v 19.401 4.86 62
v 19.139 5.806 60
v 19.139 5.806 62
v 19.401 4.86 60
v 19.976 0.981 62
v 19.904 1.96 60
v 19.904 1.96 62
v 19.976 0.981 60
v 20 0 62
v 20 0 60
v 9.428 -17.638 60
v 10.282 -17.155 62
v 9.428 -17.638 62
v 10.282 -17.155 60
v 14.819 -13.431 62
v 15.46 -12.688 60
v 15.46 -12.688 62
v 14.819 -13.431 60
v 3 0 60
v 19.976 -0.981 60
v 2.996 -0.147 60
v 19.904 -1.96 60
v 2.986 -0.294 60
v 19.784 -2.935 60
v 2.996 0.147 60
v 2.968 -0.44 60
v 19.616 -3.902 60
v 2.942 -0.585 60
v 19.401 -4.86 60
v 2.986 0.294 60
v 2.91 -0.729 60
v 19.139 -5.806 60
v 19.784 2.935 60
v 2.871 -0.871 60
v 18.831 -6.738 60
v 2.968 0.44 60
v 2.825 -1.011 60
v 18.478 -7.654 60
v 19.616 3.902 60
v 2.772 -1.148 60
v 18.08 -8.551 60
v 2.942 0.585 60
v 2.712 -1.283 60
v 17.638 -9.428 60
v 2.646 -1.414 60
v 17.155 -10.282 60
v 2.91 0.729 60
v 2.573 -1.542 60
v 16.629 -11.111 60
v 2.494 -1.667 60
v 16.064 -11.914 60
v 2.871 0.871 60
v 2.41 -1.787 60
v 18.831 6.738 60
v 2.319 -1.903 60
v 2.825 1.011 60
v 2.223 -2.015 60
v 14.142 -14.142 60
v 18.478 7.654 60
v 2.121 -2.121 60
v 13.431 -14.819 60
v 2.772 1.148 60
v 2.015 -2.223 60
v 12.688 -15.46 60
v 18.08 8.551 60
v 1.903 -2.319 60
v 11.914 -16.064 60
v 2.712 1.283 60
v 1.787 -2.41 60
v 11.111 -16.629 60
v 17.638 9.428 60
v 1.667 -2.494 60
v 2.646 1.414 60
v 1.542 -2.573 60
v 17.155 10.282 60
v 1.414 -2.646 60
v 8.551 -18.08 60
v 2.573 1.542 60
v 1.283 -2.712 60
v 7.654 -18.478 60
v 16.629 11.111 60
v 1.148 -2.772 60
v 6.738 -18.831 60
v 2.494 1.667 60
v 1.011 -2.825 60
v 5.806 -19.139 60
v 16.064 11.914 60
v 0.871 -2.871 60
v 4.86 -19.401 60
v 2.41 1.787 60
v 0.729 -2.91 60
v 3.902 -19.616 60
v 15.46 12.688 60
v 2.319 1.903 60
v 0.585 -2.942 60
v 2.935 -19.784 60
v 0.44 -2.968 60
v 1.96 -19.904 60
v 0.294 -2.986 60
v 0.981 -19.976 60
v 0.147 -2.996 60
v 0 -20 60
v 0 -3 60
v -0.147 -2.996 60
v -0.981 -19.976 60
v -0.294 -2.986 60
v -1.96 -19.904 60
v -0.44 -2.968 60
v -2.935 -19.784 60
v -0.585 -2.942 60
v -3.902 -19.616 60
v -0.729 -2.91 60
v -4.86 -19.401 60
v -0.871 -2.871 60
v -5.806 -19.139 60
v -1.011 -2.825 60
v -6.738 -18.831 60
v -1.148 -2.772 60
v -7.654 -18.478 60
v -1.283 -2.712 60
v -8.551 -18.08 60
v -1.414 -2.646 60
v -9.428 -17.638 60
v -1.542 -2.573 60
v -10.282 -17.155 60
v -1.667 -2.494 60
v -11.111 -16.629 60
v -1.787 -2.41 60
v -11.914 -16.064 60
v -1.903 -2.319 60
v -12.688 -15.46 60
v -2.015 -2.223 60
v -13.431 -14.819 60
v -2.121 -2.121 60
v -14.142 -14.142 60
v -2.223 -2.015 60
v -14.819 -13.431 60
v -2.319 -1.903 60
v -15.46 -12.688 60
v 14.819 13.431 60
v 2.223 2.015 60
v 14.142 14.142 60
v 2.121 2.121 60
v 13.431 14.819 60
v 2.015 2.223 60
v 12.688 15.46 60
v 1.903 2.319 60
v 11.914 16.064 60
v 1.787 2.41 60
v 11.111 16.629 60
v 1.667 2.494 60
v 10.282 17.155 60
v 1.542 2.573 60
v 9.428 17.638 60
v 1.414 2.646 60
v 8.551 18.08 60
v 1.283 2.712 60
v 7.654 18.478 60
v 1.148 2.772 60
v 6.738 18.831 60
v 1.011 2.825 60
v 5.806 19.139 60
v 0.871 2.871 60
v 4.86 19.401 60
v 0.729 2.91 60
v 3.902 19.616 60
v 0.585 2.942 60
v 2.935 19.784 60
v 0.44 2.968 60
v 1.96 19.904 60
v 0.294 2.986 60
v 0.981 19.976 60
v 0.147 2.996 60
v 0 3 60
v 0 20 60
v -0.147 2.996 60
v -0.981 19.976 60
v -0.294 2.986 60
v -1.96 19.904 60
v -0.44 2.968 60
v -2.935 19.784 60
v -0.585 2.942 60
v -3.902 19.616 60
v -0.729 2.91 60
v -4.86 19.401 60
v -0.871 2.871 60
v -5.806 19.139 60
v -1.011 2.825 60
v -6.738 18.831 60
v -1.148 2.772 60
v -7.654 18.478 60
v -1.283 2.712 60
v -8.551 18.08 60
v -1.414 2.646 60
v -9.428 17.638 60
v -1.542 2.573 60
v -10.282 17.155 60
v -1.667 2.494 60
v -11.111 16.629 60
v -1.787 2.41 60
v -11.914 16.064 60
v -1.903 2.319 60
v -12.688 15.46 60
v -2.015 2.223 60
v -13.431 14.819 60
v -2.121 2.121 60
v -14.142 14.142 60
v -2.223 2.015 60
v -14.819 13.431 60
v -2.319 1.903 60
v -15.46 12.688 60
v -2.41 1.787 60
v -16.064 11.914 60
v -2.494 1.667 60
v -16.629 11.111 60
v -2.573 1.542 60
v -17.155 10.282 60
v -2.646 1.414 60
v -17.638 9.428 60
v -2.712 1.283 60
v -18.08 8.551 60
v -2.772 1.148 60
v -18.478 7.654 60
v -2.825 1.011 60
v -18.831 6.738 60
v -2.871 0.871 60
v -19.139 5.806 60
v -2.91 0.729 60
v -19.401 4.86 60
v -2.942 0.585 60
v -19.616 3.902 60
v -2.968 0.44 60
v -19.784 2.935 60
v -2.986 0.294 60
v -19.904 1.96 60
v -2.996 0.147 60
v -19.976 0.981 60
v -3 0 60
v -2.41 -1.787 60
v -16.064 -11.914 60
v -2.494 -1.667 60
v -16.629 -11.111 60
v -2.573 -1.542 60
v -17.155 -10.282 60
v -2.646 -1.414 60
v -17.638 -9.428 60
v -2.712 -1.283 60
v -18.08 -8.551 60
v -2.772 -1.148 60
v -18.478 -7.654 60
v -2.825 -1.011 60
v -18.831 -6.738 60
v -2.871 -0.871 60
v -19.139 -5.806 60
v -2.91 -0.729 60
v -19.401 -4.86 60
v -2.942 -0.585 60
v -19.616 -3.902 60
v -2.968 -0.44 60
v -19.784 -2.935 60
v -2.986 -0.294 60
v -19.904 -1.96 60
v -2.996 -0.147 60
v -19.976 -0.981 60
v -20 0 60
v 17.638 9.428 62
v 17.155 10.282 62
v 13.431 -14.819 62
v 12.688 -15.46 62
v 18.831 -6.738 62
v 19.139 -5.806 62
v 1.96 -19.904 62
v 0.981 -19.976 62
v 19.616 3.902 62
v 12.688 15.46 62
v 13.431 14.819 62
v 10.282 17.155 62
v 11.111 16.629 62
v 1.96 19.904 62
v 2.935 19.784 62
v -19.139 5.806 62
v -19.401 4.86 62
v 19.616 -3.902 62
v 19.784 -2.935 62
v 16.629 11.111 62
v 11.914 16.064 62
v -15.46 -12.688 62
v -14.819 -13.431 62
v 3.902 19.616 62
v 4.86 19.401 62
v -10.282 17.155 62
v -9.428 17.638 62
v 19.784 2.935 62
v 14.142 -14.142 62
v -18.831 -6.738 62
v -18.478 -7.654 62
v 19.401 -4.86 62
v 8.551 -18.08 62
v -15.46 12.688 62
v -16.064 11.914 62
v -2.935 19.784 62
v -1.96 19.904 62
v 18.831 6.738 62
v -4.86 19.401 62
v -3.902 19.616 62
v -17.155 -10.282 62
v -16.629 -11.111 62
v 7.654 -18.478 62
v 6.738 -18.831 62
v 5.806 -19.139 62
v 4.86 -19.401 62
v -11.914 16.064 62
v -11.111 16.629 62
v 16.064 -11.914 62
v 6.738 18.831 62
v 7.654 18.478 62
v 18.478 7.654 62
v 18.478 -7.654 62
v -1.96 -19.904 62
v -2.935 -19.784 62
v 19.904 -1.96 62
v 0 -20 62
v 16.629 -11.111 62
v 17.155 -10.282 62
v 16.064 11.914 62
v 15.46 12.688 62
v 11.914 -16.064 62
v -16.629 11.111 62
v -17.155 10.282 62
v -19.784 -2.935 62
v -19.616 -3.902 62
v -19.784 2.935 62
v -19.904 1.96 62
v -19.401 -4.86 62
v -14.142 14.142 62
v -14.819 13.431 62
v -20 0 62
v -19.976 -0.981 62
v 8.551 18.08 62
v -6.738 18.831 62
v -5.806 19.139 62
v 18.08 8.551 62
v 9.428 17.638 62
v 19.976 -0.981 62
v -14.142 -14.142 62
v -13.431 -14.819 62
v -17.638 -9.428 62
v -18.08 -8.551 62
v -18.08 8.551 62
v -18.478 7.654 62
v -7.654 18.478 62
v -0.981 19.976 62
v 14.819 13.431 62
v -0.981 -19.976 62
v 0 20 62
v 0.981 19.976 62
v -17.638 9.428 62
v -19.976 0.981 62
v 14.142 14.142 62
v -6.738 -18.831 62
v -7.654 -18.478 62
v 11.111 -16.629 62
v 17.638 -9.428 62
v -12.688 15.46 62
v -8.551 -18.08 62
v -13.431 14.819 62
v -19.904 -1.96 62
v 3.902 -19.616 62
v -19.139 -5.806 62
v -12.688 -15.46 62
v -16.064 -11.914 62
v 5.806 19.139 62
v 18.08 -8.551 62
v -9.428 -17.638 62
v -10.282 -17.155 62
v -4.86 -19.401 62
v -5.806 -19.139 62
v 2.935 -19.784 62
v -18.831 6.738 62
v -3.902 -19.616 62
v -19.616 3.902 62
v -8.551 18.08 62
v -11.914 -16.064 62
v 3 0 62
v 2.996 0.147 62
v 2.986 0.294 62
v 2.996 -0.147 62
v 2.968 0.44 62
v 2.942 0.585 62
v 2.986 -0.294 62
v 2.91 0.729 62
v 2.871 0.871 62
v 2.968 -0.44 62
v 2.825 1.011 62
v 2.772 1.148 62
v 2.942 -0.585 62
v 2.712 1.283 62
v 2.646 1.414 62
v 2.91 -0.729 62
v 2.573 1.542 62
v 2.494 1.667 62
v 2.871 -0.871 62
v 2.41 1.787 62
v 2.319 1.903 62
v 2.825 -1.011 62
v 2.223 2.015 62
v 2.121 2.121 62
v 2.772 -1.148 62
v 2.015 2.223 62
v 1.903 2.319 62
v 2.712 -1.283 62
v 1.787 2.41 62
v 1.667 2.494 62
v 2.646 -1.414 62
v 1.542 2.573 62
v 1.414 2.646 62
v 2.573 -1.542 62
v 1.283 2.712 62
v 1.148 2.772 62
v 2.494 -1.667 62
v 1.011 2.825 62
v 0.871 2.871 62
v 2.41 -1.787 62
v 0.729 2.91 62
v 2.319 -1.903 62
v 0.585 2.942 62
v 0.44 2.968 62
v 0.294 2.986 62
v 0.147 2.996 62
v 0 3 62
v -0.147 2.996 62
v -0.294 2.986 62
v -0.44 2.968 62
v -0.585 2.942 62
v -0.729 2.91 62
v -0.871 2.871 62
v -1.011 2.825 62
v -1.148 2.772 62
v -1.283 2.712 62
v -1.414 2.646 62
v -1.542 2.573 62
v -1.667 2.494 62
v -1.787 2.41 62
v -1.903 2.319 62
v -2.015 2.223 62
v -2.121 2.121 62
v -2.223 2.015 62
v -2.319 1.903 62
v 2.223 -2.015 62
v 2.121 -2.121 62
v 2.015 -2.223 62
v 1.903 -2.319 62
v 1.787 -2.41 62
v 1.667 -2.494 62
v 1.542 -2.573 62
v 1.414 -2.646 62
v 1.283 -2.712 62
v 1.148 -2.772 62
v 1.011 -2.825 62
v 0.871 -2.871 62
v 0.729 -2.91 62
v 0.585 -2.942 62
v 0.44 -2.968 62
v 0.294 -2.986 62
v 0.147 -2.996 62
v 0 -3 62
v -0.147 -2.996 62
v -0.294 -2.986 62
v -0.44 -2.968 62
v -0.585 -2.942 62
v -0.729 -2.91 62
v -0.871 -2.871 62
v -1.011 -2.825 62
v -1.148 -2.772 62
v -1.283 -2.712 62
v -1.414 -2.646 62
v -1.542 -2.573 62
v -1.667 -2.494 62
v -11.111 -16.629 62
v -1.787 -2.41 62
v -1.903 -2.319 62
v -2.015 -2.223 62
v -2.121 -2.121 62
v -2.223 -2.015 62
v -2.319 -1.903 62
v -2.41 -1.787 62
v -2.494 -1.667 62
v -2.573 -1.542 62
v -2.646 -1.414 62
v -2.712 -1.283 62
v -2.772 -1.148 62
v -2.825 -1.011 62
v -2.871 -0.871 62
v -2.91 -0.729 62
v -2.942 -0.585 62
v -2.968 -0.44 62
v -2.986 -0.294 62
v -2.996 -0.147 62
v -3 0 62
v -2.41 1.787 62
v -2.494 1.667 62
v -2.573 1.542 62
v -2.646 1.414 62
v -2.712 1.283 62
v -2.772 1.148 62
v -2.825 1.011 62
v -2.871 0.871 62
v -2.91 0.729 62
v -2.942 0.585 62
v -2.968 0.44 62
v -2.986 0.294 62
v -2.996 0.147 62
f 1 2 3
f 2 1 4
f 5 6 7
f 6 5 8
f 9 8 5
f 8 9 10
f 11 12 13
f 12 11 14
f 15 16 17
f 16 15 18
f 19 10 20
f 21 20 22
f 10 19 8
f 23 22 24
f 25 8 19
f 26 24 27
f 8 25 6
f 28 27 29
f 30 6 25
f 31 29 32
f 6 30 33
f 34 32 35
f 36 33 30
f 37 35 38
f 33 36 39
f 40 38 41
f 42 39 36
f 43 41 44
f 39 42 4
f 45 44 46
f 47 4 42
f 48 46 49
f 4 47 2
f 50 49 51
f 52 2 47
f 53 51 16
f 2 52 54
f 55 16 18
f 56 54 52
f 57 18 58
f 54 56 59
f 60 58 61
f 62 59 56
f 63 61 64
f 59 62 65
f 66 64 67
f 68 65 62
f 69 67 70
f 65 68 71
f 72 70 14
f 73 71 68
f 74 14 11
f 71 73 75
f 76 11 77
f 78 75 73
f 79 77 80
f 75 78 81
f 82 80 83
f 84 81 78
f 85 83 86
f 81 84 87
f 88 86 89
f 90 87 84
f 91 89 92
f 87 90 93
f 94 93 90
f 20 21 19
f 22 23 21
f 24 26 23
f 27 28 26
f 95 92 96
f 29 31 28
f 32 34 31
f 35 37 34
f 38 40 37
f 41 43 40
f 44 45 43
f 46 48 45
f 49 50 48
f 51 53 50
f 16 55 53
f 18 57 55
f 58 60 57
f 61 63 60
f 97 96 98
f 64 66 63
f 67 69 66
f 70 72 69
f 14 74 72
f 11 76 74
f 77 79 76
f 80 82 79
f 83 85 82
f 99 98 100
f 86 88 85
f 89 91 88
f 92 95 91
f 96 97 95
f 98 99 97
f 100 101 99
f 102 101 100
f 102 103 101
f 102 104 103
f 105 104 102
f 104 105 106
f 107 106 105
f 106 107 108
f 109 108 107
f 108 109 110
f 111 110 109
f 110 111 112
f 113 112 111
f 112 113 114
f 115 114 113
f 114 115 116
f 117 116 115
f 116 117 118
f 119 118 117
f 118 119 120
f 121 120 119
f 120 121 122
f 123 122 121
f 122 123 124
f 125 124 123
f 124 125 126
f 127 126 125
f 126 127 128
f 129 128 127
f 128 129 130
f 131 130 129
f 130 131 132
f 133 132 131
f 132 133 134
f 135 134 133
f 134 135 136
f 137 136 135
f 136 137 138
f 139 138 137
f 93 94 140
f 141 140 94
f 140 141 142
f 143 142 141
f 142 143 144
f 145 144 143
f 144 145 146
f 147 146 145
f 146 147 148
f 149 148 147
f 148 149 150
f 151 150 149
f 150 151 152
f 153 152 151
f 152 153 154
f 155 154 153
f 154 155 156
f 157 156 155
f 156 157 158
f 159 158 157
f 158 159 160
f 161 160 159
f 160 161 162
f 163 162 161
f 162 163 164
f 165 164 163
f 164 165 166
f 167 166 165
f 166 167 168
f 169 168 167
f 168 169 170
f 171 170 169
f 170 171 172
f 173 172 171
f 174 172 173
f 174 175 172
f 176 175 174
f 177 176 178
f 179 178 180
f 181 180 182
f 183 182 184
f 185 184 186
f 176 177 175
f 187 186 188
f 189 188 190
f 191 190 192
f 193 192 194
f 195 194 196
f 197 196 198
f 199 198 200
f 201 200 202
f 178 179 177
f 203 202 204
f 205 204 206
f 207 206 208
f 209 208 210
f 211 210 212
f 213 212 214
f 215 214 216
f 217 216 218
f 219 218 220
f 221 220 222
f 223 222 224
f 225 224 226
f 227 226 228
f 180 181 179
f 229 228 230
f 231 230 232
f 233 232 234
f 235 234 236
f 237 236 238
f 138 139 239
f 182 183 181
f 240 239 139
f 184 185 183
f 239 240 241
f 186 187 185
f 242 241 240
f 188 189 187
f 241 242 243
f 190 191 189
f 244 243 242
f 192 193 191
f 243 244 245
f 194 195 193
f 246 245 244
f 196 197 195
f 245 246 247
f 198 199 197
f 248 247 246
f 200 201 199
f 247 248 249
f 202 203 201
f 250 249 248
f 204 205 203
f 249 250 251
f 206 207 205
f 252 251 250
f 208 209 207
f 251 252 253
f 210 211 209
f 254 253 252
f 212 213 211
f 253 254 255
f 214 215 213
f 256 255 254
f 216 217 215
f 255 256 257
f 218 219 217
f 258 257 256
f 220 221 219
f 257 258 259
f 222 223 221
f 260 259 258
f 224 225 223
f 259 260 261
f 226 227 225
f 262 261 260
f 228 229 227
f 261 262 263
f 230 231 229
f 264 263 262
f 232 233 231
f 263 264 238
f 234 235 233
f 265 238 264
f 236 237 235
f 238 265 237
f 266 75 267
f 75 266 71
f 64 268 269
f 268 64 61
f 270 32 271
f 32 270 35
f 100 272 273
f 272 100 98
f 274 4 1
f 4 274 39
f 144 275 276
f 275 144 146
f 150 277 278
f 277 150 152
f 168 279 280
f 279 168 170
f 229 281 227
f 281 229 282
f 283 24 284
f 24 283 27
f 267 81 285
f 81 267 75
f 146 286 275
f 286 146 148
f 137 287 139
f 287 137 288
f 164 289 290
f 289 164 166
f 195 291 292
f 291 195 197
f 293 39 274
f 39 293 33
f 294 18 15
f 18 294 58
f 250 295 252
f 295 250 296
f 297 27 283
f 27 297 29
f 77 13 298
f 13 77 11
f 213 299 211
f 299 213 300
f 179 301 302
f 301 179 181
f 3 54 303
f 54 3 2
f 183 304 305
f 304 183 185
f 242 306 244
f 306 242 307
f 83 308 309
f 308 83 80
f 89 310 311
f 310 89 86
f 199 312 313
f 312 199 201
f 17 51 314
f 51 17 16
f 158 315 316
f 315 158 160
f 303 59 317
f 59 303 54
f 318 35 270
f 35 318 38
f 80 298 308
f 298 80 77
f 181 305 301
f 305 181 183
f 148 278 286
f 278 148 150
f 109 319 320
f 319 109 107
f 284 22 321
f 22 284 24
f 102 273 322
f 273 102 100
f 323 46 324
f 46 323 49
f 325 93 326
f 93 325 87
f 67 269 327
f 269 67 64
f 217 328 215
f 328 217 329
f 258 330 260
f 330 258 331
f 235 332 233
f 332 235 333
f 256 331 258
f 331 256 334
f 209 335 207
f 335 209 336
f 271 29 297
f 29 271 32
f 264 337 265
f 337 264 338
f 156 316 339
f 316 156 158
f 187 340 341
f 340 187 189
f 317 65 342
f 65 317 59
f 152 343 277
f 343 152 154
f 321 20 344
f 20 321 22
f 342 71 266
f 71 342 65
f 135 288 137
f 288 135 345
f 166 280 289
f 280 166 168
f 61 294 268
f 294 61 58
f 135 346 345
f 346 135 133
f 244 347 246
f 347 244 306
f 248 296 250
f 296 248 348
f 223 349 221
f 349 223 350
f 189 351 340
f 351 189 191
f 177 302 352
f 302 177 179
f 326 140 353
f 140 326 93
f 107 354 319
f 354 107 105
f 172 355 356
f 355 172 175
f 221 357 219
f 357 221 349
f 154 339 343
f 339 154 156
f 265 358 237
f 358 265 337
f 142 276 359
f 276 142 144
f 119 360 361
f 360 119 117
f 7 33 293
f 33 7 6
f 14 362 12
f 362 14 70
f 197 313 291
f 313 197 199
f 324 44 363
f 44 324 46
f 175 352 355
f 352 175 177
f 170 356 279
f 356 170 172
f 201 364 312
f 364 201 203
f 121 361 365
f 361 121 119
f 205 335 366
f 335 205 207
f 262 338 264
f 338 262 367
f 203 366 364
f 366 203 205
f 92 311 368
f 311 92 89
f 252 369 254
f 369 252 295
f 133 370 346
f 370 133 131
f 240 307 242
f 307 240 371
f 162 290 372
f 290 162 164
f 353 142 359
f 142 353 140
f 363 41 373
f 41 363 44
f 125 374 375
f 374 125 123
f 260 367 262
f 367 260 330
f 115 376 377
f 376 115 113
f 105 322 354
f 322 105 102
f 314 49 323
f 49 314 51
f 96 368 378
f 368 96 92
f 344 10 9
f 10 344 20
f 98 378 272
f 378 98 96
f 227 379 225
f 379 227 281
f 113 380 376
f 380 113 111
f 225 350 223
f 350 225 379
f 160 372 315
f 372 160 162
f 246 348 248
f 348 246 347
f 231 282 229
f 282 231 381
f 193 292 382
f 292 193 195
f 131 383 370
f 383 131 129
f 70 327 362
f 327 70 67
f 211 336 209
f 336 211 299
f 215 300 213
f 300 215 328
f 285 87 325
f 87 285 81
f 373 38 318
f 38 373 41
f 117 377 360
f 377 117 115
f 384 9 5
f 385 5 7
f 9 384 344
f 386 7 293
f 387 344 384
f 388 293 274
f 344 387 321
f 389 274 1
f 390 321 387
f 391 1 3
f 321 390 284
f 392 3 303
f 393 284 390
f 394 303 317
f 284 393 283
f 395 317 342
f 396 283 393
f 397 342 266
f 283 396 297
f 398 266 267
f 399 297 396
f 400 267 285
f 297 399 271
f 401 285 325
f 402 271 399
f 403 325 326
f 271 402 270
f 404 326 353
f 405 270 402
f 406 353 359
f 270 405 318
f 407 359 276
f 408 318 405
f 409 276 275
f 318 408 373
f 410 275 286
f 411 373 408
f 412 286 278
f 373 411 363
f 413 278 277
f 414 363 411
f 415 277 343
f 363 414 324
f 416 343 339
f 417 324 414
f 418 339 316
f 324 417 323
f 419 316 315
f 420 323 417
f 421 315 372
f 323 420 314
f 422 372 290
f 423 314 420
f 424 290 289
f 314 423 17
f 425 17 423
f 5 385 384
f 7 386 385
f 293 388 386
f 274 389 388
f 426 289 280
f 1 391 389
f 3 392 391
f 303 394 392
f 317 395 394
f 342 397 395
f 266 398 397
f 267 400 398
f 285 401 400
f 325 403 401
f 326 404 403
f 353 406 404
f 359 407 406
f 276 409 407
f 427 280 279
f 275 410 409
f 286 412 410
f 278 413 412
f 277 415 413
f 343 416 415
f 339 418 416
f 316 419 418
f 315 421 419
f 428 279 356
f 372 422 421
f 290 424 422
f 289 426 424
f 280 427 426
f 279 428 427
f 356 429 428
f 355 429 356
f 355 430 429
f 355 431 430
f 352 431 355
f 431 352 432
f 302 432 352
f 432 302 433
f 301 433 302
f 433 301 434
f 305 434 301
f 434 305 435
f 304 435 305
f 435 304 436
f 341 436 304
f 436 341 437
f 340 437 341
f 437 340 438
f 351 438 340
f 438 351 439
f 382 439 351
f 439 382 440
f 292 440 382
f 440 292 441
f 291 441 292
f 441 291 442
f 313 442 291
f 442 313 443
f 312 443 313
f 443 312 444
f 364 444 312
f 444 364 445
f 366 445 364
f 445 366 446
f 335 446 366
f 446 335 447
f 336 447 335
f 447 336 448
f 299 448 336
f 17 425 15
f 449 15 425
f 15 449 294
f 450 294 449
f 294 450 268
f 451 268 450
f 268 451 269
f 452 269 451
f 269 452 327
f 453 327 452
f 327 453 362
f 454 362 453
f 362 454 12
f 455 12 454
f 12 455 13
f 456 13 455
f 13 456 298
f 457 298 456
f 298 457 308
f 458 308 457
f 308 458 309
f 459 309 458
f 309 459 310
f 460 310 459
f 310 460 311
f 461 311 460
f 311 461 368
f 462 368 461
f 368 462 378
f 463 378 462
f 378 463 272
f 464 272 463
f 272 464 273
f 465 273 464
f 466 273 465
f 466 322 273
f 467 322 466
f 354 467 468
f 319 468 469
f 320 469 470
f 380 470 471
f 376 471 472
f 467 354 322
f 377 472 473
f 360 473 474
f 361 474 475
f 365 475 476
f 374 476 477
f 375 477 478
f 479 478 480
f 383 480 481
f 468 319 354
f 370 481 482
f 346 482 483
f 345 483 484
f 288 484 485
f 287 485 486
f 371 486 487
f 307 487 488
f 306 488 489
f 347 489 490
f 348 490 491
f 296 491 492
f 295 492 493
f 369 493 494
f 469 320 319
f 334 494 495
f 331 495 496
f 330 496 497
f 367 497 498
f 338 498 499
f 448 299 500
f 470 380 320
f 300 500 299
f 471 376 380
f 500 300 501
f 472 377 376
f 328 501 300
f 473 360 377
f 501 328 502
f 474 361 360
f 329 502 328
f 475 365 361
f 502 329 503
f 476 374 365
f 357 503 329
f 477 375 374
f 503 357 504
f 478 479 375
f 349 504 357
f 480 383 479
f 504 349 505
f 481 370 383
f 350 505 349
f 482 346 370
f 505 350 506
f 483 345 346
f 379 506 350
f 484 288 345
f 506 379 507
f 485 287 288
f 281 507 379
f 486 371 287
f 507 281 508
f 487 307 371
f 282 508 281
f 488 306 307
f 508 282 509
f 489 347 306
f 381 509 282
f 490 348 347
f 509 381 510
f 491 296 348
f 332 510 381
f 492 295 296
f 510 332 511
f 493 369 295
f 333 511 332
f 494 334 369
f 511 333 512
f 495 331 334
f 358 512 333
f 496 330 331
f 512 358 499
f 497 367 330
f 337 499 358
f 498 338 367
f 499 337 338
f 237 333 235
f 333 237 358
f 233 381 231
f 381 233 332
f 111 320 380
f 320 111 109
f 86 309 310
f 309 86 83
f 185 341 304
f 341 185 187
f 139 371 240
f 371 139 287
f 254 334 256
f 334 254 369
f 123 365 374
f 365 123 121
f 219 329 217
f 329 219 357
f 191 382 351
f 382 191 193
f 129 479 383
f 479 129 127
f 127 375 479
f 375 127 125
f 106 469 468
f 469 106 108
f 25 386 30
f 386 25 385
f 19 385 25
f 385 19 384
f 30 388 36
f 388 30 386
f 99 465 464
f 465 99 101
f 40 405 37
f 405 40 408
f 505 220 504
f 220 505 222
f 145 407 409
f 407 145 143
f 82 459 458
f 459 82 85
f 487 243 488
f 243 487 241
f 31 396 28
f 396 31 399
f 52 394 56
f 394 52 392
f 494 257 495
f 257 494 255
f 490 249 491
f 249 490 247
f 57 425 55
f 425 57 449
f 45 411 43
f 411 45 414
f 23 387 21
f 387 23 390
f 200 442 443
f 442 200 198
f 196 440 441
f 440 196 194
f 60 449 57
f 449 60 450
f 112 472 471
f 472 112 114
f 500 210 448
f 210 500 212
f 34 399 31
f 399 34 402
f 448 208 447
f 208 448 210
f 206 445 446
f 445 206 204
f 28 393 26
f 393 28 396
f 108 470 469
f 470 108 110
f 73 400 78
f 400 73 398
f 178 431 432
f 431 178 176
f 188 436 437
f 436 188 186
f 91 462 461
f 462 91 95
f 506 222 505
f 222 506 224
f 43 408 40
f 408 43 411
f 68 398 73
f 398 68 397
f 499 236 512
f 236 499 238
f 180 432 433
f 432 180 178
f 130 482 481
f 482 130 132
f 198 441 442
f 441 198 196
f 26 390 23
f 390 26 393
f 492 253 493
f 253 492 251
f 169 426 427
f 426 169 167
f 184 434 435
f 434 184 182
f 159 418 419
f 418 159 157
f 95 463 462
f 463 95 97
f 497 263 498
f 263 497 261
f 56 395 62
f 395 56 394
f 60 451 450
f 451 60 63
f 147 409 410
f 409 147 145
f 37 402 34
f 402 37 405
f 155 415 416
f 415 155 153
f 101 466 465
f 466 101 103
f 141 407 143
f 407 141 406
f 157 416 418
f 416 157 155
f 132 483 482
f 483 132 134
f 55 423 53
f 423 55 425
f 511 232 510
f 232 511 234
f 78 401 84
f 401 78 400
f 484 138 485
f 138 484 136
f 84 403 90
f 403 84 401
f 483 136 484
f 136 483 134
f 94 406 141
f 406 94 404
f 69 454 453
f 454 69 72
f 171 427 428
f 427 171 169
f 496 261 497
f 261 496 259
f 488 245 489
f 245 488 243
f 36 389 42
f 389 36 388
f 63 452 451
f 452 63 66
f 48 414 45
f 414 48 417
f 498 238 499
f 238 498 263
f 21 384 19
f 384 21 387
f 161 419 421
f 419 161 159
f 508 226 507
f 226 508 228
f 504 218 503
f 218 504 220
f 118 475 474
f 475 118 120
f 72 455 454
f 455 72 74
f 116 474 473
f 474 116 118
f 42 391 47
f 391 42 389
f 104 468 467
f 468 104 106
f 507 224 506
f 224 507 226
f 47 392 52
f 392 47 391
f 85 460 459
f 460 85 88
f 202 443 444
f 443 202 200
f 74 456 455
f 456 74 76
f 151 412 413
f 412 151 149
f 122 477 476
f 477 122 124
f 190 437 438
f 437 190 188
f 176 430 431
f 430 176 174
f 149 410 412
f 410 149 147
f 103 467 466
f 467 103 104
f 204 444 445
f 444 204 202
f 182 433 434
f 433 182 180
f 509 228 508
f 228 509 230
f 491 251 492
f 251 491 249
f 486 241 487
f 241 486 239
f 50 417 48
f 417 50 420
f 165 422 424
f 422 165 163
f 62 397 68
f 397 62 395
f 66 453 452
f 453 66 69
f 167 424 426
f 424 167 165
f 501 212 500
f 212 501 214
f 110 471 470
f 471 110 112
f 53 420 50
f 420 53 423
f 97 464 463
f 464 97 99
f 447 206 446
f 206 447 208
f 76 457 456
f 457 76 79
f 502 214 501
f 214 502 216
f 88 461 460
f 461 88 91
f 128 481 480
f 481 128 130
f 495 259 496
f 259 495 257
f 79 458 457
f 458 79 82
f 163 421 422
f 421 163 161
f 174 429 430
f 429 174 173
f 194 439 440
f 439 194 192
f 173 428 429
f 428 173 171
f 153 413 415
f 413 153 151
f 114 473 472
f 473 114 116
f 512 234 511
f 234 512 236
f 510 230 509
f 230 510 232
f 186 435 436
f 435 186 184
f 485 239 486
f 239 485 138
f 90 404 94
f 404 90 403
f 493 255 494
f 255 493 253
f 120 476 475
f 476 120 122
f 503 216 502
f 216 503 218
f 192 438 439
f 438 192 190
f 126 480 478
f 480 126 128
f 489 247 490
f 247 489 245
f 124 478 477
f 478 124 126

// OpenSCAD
// file: common_params.scad
cylinder_radius = 20.000000;
cylinder_height = 60.000000;
wall_thickness = 2.000000;

cap_thickness = 2.000000;

rod_radius = 2.000000;
rod_height = 50.000000;

ring_outer_radius = 8.000000;
ring_inner_radius = 4.000000;
ring_thickness = 3.000000;
ring_z = 40.000000;

$fn = 128;
// main file
include <common_params.scad>;

hole_radius = 3.000000;

translate([0, 0, cylinder_height])
difference() {
    cylinder(h = cap_thickness, r = cylinder_radius);
    translate([0, 0, -0.1])
        cylinder(h = cap_thickness + 0.2, r = hole_radius);
}
